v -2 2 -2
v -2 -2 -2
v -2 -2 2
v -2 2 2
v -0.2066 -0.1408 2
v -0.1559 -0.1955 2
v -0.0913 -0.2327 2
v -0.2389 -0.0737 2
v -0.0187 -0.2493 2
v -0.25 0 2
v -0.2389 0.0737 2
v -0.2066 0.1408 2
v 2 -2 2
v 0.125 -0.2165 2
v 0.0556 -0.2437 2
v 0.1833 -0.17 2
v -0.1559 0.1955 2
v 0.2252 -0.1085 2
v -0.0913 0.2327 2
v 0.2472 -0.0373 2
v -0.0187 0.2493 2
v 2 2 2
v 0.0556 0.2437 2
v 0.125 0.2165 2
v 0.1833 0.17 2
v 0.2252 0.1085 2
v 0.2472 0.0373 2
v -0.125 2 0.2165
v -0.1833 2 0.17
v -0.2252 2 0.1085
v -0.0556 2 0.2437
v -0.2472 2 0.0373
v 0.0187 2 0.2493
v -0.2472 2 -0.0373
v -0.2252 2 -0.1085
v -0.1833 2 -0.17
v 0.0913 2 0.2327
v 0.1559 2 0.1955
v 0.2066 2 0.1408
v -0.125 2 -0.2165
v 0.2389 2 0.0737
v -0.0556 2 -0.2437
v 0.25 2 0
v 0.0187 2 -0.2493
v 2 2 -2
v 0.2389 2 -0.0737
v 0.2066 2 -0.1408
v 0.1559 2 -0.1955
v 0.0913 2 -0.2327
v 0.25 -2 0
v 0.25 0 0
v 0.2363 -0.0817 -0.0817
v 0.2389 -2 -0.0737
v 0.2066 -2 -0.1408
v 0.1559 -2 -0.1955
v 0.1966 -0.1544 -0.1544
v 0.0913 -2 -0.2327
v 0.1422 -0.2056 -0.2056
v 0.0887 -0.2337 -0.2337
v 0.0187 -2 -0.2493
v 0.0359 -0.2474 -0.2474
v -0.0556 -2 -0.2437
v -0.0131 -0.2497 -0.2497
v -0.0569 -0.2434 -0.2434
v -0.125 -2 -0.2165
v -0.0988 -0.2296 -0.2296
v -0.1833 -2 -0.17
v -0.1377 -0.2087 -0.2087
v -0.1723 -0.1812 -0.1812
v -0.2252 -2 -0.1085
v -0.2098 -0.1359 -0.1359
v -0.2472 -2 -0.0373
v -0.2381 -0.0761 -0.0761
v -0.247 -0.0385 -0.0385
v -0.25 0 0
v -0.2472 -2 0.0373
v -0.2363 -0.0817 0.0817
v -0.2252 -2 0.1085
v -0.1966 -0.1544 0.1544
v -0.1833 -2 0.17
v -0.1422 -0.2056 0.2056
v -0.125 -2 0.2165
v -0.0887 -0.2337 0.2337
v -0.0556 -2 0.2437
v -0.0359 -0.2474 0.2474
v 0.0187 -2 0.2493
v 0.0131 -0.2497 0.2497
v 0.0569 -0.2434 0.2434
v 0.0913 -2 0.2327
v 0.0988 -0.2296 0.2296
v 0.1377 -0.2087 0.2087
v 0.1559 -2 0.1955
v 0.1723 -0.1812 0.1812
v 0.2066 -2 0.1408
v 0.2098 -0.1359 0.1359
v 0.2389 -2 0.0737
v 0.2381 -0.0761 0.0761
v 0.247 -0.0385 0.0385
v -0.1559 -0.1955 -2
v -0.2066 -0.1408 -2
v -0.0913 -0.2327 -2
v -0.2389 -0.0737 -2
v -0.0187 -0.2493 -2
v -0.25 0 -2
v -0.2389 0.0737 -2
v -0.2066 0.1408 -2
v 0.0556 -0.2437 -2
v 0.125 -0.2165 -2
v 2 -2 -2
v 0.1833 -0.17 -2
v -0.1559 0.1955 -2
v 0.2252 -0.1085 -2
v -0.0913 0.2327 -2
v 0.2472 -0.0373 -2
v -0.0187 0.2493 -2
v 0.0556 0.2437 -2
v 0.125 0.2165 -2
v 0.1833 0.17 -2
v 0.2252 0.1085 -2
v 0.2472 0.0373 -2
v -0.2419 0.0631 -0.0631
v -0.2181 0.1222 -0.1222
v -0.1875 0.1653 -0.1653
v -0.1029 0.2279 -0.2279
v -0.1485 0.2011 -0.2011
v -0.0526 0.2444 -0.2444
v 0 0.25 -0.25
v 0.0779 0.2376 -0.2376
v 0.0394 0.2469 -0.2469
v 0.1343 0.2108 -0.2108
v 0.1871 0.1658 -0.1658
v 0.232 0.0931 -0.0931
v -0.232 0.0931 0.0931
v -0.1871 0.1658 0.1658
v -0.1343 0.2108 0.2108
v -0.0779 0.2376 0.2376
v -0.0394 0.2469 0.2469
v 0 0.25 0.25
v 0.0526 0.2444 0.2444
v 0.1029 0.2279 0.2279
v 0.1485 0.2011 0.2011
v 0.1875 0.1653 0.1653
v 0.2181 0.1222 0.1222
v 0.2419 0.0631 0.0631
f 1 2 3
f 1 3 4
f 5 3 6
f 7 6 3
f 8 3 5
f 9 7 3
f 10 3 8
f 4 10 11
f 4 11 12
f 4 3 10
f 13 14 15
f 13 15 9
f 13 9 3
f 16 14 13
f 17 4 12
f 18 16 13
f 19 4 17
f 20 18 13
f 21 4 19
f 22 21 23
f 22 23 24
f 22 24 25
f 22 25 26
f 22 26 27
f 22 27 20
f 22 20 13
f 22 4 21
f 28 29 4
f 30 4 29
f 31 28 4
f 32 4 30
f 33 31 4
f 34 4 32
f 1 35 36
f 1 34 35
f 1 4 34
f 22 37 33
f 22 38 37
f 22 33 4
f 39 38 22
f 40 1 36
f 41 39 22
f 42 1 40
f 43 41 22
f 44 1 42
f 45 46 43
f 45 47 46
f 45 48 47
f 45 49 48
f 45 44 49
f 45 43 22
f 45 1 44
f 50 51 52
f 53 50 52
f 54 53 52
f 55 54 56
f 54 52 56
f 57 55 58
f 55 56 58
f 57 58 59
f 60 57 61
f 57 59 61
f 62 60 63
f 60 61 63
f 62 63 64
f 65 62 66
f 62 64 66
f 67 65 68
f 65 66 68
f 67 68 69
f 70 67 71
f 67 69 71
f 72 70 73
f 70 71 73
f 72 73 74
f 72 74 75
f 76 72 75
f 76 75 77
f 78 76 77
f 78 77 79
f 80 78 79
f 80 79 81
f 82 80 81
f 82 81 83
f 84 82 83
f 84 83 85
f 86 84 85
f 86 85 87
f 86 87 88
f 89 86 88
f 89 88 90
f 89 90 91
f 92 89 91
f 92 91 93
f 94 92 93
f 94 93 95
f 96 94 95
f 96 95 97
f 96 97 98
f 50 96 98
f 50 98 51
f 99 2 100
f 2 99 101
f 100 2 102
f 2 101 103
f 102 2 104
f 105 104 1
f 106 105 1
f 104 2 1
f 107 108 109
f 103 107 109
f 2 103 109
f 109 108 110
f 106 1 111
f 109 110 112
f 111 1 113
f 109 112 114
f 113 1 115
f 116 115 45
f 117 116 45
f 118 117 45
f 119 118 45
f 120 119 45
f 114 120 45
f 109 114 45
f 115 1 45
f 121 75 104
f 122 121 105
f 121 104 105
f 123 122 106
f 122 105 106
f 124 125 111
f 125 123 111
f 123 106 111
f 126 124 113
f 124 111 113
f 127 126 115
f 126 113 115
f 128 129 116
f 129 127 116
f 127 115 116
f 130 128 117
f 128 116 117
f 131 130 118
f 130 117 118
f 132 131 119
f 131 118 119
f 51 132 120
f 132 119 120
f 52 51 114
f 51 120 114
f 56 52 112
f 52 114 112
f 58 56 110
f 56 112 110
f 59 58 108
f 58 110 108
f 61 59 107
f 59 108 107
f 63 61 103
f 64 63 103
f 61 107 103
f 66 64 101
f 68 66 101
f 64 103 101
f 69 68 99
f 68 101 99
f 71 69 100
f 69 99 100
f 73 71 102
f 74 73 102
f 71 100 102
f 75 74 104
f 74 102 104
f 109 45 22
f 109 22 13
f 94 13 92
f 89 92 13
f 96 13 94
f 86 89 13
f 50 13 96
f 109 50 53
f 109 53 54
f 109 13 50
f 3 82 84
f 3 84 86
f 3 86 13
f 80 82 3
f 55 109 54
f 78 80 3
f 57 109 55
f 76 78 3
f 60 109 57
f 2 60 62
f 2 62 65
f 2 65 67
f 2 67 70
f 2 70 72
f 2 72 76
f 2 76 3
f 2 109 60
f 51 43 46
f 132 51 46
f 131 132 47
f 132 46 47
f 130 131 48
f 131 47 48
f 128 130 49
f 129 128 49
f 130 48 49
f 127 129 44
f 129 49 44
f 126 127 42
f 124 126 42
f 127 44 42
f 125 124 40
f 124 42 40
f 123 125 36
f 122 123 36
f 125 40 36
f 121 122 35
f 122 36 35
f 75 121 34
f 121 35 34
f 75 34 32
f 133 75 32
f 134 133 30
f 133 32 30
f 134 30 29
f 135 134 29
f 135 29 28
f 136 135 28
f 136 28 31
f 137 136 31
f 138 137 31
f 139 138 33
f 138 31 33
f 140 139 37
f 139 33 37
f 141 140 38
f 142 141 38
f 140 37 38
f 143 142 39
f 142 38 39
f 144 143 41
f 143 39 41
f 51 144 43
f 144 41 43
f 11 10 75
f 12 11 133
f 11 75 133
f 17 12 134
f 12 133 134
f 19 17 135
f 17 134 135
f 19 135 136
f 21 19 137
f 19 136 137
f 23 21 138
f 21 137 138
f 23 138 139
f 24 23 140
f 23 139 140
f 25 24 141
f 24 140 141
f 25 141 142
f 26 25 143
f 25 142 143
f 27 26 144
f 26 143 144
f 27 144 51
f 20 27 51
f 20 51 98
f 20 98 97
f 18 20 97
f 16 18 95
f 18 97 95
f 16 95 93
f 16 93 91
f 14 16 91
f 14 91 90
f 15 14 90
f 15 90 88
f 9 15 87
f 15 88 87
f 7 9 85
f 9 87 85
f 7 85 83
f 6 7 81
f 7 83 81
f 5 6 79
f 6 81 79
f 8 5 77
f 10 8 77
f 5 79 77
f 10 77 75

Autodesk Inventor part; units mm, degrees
ref_plane "YZ Plane" through (0, 0, 0) normal (1, 0, 0) x (0, 1, 0)
ref_plane "XZ Plane" through (0, 0, 0) normal (0, 1, 0) x (-1, 0, 0)
ref_plane "XY Plane" through (0, 0, 0) normal (0, 0, 1) x (1, 0, 0)
sketch "Skizze1" plane through (0, 0, 0) normal (0, 0, 1) x (1, 0, 0)
  line L0 (2, -2) -> (-2, -2)
  line L1 (-2, -2) -> (-2, 2)
  line L2 (-2, 2) -> (2, 2)
  line L3 (2, 2) -> (2, -2)
  line L4 (2, -2) -> (-2, 2) construction
  line L5 (-2, -2) -> (2, 2) construction
  point P0 (0, 0)
  dimension "d0" = 4
  dimension "d1" = 4
extrude "Extrusion1" add sketch "Skizze1" along normal mid plane 4
sketch "Skizze2" plane through (-2, 2, 2) normal (0, 1, 0) x (1, 0, 0)
  circle A0 centre (2, 2) radius 0.25
  dimension "d4" = 0.5
extrude "Extrusion2" cut sketch "Skizze2" against normal blind 4
sketch "Skizze3" plane through (0, 0, -2) normal (0, 0, -1) x (-1, 0, 0)
  circle A0 centre (0, 0) radius 0.25
  dimension "d7" = 0.5
extrude "Extrusion3" cut sketch "Skizze3" against normal blind 4
ref_plane "Arbeitsebene1" through (0, -2, 2) normal (1, 0, 0) x (0, 0, -1)
properties part number "00_BS_KES400A_4mm"
